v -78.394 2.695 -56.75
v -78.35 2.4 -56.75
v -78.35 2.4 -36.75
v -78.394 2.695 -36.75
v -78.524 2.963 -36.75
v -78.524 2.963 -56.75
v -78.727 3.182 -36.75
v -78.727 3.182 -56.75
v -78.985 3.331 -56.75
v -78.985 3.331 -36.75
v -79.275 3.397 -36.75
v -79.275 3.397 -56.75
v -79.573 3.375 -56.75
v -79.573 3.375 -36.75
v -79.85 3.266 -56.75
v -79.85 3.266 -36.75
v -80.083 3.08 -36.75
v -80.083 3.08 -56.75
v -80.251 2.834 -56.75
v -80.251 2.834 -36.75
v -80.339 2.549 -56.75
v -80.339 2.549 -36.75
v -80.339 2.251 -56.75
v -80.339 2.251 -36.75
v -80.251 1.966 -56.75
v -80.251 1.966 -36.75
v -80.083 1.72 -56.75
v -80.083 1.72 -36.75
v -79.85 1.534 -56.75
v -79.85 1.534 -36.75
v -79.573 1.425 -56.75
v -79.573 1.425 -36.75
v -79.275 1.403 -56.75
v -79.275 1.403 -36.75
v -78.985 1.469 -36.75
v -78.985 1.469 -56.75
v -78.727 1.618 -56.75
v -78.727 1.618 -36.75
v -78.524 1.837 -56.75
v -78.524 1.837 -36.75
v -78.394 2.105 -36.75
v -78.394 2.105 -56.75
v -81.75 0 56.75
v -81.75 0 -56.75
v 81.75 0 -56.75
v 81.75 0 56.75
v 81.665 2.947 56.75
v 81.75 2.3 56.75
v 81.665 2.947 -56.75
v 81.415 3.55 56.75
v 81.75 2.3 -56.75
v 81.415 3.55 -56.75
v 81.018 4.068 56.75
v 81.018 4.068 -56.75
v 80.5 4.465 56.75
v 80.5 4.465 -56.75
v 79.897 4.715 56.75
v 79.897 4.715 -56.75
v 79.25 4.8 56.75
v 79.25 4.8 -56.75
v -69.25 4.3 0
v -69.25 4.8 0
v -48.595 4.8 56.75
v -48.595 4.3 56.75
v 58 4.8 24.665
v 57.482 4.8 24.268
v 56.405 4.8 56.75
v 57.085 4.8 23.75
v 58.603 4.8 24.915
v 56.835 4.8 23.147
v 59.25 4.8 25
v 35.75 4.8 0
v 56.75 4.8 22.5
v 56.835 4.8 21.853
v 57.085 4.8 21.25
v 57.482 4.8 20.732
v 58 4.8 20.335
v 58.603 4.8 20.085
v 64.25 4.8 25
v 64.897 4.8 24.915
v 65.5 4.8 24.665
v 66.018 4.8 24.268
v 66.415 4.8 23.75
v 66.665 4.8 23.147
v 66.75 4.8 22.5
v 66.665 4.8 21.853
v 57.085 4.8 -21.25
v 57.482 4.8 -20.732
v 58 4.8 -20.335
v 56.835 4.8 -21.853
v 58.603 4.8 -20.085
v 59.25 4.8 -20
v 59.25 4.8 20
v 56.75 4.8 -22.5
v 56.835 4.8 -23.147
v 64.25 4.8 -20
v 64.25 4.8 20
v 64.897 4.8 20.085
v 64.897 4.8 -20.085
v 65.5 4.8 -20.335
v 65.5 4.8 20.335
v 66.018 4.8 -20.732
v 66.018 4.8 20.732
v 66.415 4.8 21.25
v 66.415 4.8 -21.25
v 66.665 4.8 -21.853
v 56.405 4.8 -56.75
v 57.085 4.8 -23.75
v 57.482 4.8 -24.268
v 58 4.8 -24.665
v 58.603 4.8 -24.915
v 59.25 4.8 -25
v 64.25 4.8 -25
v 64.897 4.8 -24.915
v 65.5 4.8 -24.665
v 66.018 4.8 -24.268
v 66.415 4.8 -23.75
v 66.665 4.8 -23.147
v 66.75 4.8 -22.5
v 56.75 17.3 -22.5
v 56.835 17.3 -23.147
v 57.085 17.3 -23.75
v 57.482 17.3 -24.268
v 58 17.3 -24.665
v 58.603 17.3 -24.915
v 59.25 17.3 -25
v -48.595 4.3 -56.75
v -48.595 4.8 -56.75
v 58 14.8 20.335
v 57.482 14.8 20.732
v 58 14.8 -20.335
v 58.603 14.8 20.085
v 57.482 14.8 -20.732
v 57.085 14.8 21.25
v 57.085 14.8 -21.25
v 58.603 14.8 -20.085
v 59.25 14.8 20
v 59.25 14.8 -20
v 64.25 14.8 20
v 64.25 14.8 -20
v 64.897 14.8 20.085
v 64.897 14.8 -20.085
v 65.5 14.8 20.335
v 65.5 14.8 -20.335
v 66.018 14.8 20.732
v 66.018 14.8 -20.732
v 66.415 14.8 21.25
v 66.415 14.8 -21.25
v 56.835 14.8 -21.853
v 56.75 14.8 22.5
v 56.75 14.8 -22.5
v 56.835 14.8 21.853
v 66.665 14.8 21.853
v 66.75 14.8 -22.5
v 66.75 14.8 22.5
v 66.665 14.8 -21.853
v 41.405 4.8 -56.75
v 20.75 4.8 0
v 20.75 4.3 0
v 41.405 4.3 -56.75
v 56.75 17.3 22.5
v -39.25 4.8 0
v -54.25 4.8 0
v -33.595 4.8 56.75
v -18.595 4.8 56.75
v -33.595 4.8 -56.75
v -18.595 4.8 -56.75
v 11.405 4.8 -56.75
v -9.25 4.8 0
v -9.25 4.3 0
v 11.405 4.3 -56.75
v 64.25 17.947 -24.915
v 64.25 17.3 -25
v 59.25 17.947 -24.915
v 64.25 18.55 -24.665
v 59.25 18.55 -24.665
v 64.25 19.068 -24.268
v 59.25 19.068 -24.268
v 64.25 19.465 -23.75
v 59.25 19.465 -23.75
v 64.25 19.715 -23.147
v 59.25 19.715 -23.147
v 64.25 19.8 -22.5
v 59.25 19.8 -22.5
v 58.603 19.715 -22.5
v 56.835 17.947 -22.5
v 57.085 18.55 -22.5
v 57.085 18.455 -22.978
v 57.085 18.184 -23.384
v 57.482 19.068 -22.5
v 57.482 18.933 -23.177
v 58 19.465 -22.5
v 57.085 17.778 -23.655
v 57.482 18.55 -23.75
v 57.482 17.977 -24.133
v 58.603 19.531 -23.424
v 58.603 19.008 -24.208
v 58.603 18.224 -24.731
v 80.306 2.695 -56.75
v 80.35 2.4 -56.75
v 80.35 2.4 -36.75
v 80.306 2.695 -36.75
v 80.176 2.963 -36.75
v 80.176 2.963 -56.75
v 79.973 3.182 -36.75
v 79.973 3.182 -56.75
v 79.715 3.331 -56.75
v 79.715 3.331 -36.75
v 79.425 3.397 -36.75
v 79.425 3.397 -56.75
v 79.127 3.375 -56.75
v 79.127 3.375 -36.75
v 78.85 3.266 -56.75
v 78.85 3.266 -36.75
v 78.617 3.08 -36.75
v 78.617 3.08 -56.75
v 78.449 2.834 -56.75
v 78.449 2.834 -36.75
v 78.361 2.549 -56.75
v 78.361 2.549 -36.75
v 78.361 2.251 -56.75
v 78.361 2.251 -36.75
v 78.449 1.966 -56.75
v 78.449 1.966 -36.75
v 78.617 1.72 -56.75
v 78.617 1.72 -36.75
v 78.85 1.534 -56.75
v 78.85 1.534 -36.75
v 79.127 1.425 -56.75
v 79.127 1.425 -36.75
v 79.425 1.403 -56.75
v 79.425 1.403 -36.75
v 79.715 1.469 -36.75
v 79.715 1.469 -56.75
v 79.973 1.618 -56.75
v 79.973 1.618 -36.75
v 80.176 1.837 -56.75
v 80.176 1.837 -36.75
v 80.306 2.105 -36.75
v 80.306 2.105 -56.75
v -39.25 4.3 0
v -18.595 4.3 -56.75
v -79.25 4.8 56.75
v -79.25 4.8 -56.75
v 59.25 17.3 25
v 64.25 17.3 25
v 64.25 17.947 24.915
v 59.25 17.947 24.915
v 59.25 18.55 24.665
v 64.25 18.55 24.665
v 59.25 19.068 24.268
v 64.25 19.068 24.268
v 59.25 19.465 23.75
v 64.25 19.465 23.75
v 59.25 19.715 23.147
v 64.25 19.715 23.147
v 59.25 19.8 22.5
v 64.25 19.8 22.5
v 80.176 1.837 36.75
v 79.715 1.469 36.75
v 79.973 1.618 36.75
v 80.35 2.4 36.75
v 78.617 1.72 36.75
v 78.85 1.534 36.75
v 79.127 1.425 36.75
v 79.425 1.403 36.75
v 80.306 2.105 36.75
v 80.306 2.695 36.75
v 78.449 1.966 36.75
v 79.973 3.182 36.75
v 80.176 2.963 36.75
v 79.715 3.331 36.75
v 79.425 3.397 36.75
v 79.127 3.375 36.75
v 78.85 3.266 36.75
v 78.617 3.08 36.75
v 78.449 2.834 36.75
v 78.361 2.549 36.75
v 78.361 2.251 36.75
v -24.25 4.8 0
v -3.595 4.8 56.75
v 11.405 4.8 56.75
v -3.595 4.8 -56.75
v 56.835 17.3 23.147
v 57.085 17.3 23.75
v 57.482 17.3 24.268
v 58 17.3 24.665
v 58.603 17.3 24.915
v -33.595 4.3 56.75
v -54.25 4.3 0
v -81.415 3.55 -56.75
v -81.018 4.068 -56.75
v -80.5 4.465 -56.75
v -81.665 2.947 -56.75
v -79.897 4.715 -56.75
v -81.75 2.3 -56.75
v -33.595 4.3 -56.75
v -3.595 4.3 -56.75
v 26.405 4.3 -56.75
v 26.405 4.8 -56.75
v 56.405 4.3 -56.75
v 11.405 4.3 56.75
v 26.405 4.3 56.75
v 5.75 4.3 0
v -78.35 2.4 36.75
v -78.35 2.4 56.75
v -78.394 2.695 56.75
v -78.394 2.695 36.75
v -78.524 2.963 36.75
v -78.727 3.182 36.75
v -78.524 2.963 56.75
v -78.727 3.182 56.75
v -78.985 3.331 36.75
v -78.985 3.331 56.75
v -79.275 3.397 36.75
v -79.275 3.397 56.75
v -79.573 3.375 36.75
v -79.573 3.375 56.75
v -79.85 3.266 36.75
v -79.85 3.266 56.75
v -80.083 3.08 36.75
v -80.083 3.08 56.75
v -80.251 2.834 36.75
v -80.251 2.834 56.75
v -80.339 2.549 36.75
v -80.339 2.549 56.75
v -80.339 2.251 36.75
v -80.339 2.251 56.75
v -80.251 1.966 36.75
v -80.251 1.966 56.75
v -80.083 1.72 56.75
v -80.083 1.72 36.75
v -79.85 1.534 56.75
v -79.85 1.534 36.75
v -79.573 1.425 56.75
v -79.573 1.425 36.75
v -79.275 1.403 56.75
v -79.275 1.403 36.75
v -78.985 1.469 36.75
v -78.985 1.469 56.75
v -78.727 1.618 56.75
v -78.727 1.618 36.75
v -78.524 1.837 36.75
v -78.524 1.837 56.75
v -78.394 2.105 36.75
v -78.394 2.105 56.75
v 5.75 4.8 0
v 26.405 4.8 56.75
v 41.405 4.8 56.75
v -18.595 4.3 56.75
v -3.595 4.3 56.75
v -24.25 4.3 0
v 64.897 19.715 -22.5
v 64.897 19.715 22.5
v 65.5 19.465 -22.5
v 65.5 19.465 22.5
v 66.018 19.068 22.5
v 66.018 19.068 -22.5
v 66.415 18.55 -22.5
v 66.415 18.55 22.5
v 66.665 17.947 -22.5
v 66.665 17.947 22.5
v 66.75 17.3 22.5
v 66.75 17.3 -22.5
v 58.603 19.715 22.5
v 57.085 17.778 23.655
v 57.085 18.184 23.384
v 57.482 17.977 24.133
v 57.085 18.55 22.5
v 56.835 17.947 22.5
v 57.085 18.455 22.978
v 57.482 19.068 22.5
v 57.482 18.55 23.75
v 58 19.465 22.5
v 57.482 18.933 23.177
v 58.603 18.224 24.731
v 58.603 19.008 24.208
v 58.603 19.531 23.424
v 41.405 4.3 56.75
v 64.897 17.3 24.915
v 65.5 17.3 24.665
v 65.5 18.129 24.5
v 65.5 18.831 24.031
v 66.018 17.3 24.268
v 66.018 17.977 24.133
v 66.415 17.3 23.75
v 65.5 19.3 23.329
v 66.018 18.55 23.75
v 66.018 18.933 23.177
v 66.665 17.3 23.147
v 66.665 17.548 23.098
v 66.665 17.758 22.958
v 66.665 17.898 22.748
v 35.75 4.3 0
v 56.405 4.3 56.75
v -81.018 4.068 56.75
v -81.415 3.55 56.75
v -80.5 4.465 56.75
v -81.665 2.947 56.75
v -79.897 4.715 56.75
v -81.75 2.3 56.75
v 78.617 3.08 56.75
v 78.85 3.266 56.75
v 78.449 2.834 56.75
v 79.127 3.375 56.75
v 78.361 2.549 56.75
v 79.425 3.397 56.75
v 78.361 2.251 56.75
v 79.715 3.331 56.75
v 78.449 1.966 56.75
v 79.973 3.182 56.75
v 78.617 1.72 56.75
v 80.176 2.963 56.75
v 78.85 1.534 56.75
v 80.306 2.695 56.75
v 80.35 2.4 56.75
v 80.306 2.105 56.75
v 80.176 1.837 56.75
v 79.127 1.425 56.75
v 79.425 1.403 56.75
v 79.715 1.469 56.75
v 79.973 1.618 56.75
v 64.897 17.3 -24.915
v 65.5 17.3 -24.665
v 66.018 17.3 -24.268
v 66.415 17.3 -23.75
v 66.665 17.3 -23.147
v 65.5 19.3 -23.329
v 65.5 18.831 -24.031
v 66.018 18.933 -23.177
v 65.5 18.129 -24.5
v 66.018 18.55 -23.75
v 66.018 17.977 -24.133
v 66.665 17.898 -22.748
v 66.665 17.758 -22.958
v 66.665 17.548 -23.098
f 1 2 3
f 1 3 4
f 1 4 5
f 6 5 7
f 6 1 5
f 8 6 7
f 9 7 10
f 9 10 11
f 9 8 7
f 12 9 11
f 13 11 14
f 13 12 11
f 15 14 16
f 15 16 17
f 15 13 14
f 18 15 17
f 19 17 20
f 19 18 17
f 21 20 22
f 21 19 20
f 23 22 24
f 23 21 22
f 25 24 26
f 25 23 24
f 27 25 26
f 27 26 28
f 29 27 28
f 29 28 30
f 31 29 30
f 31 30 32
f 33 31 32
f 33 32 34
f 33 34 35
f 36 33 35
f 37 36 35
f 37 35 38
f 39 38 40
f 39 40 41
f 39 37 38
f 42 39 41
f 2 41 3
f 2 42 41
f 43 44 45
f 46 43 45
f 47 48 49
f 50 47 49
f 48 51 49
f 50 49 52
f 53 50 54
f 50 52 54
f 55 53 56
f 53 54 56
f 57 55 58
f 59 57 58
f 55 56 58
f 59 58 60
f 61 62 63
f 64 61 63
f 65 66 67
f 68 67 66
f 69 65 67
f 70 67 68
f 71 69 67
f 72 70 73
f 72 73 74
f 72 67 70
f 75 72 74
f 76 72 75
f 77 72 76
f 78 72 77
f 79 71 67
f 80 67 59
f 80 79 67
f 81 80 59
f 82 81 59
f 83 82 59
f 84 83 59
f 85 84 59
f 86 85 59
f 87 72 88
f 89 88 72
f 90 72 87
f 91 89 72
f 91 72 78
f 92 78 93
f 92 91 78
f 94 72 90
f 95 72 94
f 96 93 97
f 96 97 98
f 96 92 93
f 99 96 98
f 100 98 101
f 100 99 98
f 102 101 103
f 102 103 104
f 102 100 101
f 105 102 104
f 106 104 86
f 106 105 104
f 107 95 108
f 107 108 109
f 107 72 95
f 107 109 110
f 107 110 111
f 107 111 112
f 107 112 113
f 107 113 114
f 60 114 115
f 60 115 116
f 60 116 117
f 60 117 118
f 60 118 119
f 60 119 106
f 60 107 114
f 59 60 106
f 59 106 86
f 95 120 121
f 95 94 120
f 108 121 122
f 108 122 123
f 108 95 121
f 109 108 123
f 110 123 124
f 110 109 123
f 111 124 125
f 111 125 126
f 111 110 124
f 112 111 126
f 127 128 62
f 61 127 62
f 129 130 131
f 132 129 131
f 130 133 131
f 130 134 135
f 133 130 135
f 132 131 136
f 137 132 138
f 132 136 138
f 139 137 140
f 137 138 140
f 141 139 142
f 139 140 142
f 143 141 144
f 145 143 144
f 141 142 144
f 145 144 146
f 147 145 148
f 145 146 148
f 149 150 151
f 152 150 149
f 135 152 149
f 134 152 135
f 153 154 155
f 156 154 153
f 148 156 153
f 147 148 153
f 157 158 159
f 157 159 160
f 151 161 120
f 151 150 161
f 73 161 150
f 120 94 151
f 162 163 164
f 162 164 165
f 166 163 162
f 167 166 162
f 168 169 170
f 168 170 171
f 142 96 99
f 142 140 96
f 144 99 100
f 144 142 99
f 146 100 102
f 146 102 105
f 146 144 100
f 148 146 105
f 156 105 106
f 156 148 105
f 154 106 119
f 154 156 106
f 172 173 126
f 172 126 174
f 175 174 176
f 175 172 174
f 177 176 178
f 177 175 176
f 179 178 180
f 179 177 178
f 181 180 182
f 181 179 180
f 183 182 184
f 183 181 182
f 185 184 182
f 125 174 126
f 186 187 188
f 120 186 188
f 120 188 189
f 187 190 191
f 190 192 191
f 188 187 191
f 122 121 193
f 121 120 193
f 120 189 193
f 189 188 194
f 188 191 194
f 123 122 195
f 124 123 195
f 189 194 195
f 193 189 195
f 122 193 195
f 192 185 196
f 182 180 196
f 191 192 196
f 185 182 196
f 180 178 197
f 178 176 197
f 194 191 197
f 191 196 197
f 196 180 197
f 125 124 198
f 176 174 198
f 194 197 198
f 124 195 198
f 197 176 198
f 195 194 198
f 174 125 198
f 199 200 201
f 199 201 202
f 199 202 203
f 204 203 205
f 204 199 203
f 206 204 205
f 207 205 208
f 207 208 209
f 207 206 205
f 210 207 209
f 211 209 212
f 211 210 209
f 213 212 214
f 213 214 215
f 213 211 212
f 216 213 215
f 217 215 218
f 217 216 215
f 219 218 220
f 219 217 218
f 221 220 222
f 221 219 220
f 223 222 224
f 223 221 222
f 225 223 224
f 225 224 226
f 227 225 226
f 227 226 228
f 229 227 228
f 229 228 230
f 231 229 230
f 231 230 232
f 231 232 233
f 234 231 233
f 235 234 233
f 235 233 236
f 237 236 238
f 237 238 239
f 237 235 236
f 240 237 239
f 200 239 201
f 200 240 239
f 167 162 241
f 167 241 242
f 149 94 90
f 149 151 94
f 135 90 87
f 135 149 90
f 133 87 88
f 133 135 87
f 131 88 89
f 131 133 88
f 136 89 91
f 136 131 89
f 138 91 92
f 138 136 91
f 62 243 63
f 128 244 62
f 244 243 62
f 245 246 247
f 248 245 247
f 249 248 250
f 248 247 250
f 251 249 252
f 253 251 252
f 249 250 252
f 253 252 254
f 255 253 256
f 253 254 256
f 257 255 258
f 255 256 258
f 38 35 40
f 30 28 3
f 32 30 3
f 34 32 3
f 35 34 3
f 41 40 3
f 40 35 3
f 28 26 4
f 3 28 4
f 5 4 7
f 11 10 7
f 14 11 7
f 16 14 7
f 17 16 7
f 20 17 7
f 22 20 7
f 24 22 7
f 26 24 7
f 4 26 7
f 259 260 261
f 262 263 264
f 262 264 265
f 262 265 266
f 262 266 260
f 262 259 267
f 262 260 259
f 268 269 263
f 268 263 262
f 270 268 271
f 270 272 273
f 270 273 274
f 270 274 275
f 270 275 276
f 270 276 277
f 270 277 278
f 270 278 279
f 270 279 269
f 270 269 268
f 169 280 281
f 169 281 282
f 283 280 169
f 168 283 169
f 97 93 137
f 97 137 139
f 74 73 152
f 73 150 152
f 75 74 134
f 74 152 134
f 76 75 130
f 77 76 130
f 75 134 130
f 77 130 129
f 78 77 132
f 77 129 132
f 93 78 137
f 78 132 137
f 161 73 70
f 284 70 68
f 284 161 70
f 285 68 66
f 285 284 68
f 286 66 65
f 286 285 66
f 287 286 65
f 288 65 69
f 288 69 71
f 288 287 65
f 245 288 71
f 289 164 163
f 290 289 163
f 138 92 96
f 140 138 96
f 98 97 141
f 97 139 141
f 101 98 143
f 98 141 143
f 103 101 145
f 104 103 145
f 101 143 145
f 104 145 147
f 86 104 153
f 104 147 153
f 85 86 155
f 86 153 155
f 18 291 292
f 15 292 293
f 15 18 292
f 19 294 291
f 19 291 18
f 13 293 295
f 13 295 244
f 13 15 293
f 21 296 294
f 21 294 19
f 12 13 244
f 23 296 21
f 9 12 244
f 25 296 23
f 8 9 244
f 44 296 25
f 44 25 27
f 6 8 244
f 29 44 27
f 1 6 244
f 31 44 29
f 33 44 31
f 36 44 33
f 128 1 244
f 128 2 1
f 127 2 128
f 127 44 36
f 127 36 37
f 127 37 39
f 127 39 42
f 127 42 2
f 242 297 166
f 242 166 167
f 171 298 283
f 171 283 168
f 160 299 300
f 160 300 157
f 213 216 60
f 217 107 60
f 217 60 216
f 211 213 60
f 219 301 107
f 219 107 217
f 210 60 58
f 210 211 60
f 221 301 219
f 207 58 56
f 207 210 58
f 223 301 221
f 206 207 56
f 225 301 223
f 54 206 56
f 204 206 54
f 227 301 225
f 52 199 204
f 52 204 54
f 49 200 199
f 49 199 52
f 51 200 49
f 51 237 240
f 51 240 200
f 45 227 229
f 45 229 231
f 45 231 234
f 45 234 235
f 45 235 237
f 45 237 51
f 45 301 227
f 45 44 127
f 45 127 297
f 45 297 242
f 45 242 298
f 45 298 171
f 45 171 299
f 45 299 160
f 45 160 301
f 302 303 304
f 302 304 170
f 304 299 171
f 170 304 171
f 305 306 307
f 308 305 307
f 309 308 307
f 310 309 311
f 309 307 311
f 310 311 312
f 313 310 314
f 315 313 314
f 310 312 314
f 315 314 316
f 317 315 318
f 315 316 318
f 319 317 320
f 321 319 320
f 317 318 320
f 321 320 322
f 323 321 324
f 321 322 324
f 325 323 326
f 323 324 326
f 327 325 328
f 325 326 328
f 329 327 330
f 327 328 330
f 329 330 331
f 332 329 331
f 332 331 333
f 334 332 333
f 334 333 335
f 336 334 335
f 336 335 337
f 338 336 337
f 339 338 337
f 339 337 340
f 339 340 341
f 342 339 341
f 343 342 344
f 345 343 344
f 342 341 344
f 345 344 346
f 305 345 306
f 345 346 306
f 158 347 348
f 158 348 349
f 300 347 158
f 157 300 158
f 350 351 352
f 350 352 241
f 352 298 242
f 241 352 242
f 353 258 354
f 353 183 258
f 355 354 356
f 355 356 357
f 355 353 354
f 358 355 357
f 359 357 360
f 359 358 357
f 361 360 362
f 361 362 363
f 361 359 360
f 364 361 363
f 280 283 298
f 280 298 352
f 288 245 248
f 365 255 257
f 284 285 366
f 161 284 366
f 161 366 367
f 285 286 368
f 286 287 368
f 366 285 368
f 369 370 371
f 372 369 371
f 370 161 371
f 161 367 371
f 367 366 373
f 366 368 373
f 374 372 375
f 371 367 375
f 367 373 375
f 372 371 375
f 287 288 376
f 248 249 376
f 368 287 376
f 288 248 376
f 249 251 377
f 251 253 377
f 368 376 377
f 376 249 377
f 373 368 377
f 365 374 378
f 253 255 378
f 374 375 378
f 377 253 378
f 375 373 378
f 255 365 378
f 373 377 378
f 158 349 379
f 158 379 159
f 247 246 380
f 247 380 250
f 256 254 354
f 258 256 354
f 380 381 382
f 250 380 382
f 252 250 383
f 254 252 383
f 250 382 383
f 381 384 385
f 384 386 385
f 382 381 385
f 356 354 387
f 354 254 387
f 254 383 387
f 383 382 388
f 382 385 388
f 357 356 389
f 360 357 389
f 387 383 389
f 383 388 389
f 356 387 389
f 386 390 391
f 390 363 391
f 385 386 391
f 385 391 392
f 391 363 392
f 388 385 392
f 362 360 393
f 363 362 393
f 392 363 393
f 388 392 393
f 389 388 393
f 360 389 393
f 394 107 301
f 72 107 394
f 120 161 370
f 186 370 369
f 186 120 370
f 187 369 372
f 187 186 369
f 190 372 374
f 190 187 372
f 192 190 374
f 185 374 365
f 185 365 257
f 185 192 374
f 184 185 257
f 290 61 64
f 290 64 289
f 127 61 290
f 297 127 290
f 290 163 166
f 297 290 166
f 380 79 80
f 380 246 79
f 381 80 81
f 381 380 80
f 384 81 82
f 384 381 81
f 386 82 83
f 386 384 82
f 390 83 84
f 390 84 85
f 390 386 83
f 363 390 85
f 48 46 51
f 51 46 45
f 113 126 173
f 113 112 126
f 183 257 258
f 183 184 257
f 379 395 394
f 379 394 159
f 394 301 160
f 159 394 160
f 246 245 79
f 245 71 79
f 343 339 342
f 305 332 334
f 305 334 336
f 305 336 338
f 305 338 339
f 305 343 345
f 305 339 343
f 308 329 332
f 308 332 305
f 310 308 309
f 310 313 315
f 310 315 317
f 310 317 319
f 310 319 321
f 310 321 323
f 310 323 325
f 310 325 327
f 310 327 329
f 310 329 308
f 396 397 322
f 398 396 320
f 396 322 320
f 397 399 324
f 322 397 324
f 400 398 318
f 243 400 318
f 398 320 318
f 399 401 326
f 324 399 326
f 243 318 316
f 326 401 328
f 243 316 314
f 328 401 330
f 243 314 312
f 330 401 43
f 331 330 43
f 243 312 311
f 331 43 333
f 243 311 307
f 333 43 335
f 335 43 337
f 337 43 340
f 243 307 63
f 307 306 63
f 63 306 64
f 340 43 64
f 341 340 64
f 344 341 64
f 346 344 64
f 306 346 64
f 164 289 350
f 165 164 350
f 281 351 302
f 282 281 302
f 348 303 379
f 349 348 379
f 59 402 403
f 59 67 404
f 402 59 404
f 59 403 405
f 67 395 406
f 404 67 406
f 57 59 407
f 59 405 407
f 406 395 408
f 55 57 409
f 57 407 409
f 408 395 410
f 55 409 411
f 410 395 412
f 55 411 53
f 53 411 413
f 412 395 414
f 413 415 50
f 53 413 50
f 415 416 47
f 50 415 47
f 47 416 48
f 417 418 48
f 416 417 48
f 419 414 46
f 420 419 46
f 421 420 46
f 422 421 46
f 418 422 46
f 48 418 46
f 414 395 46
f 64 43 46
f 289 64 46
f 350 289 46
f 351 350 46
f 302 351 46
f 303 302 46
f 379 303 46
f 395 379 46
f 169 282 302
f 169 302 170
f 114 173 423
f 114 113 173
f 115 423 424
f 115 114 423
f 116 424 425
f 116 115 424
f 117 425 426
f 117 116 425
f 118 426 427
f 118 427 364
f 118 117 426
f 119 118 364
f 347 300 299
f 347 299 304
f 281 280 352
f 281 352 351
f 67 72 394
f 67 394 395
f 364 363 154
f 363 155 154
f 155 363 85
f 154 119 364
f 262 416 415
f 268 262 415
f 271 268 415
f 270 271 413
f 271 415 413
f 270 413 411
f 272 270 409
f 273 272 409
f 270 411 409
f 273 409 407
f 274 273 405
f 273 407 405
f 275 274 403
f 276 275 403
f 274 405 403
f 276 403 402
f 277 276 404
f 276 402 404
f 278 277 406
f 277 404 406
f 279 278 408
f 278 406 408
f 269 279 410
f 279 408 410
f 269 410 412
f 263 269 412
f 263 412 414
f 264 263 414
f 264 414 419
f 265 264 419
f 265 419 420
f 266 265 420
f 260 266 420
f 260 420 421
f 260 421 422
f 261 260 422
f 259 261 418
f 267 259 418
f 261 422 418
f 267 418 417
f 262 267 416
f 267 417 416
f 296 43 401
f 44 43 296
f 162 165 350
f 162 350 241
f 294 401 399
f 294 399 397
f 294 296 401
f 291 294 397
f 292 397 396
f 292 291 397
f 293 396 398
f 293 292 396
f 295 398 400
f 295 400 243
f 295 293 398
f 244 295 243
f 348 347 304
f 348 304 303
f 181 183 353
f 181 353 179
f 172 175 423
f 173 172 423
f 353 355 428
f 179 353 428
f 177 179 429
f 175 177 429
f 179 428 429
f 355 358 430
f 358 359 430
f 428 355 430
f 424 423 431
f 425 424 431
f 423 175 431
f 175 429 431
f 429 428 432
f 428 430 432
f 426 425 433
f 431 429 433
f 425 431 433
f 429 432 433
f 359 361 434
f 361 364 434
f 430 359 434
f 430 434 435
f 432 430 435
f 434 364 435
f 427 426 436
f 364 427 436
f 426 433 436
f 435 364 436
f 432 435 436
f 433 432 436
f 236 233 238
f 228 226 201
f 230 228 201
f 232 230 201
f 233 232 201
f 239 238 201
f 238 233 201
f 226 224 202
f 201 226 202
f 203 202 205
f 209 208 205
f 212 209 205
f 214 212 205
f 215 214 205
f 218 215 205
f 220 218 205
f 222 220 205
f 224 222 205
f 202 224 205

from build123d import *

# Parameters (mm, degrees)
ESBO_O1_W                = 163.5
ESBO_O1_H                = 113.5
ESBO_O1_W_2              = 160
ESBO_O1_H_2              = 110
RESSALTO_EXTRUS_O1_DEPTH = 4.8
ESBO_O2_R                = 1
CORTE_EXTRUS_O1_DEPTH    = 20
FILETE1_R                = 2.5
ESBO_O3_W                = 10
ESBO_O3_H                = 5
RESSALTO_EXTRUS_O2_DEPTH = 10
ESBO_O4_W                = 10
ESBO_O4_H                = 50
RESSALTO_EXTRUS_O3_DEPTH = 5
FILETE2_R                = 2.5
FILETE3_R                = 2.5
CORTE_EXTRUS_O2_DEPTH    = 0.5


with BuildPart() as part:
    # Esboço1 → Ressalto-extrusão1 (new body)
    # profile 1 of 2: a face of its own
    with BuildSketch(Plane(origin=(0, 0, 0), x_dir=(1, 0, 0), z_dir=(0, 1, 0))):
        Rectangle(ESBO_O1_W, ESBO_O1_H)
        Rectangle(ESBO_O1_W_2, ESBO_O1_H_2, mode=Mode.SUBTRACT)
    # profile 2 of 2: a face of its own
    with BuildSketch(Plane(origin=(0, 0, 0), x_dir=(1, 0, 0), z_dir=(0, 1, 0))):
        Rectangle(ESBO_O1_W_2, ESBO_O1_H_2)
    extrude(amount=RESSALTO_EXTRUS_O1_DEPTH)

    # Esboço2 → Corte-extrusão1 (cut)
    with BuildSketch(Plane.XY.offset(56.75)):
        with Locations((-79.35, 2.4)):
            Circle(ESBO_O2_R)
        with Locations((79.35, 2.4)):
            Circle(ESBO_O2_R)
    corte_extrus_o1 = extrude(amount=-CORTE_EXTRUS_O1_DEPTH, mode=Mode.SUBTRACT)

    # Espelhar1: Corte-extrusão1 across plane
    add(corte_extrus_o1.mirror(Plane.XY), mode=Mode.SUBTRACT)

    # Filete1
    filete1_edges = [part.edges().sort_by_distance(p)[0] for p in [
        (-81.75, 4.8, 0),
        (81.75, 4.8, 0),
    ]]
    fillet(filete1_edges, radius=FILETE1_R)

    # Esboço3 → Ressalto-extrusão2 (add)
    with BuildSketch(Plane(origin=(0, 4.8, 0), x_dir=(1, 0, 0), z_dir=(0, 1, 0))):
        with Locations((61.75, -22.5)):
            Rectangle(ESBO_O3_W, ESBO_O3_H)
        with Locations((61.75, 22.5)):
            Rectangle(ESBO_O3_W, ESBO_O3_H)
    extrude(amount=RESSALTO_EXTRUS_O2_DEPTH)

    # Esboço4 → Ressalto-extrusão3 (add)
    with BuildSketch(Plane(origin=(0, 14.8, 0), x_dir=(1, 0, 0), z_dir=(0, 1, 0))):
        with Locations((61.75, 0)):
            Rectangle(ESBO_O4_W, ESBO_O4_H)
    extrude(amount=RESSALTO_EXTRUS_O3_DEPTH)

    # Filete2
    filete2_edges = [part.edges().sort_by_distance(p)[0] for p in [
        (61.75, 19.8, -25),
        (61.75, 19.8, 25),
    ]]
    fillet(filete2_edges, radius=FILETE2_R)

    # Filete3
    filete3_edges = [part.edges().sort_by_distance(p)[0] for p in [
        (56.75, 11.05, -25),
        (56.75, 19.067766953, -24.267766953),
        (56.75, 11.05, 25),
        (56.75, 19.067766953, 24.267766953),
        (66.75, 11.05, 25),
        (66.75, 19.067766953, 24.267766953),
        (66.75, 11.05, -25),
        (66.75, 19.067766953, -24.267766953),
        (56.75, 19.8, 0),
        (66.75, 19.8, 0),
        (66.75, 9.8, 20),
        (56.75, 9.8, 20),
        (56.75, 9.8, -20),
        (66.75, 9.8, -20),
    ]]
    fillet(filete3_edges, radius=FILETE3_R - 0.0001)  # a hair under: the kernel refuses the full size

    # Esboço5 → Corte-extrusão2 (cut)
    with BuildSketch(Plane(origin=(0, 4.8, 0), x_dir=(1, 0, 0), z_dir=(0, 1, 0))):
        Polygon((-54.25, 0), (-32.411785944, 60), (-47.411785944, 60), (-69.25, 0), (-47.411785944, -60), (-32.411785944, -60), align=None)
        Polygon((-24.25, 0), (-2.411785944, -60), (-17.411785944, -60), (-39.25, 0), (-17.411785944, 60), (-2.411785944, 60), align=None)
        Polygon((5.75, 0), (27.588214056, -60), (12.588214056, -60), (-9.25, 0), (12.588214056, 60), (27.588214056, 60), align=None)
        Polygon((35.75, 0), (57.588214056, -60), (42.588214056, -60), (20.75, 0), (42.588214056, 60), (57.588214056, 60), align=None)
    extrude(amount=-CORTE_EXTRUS_O2_DEPTH, mode=Mode.SUBTRACT)


solid = part.part
